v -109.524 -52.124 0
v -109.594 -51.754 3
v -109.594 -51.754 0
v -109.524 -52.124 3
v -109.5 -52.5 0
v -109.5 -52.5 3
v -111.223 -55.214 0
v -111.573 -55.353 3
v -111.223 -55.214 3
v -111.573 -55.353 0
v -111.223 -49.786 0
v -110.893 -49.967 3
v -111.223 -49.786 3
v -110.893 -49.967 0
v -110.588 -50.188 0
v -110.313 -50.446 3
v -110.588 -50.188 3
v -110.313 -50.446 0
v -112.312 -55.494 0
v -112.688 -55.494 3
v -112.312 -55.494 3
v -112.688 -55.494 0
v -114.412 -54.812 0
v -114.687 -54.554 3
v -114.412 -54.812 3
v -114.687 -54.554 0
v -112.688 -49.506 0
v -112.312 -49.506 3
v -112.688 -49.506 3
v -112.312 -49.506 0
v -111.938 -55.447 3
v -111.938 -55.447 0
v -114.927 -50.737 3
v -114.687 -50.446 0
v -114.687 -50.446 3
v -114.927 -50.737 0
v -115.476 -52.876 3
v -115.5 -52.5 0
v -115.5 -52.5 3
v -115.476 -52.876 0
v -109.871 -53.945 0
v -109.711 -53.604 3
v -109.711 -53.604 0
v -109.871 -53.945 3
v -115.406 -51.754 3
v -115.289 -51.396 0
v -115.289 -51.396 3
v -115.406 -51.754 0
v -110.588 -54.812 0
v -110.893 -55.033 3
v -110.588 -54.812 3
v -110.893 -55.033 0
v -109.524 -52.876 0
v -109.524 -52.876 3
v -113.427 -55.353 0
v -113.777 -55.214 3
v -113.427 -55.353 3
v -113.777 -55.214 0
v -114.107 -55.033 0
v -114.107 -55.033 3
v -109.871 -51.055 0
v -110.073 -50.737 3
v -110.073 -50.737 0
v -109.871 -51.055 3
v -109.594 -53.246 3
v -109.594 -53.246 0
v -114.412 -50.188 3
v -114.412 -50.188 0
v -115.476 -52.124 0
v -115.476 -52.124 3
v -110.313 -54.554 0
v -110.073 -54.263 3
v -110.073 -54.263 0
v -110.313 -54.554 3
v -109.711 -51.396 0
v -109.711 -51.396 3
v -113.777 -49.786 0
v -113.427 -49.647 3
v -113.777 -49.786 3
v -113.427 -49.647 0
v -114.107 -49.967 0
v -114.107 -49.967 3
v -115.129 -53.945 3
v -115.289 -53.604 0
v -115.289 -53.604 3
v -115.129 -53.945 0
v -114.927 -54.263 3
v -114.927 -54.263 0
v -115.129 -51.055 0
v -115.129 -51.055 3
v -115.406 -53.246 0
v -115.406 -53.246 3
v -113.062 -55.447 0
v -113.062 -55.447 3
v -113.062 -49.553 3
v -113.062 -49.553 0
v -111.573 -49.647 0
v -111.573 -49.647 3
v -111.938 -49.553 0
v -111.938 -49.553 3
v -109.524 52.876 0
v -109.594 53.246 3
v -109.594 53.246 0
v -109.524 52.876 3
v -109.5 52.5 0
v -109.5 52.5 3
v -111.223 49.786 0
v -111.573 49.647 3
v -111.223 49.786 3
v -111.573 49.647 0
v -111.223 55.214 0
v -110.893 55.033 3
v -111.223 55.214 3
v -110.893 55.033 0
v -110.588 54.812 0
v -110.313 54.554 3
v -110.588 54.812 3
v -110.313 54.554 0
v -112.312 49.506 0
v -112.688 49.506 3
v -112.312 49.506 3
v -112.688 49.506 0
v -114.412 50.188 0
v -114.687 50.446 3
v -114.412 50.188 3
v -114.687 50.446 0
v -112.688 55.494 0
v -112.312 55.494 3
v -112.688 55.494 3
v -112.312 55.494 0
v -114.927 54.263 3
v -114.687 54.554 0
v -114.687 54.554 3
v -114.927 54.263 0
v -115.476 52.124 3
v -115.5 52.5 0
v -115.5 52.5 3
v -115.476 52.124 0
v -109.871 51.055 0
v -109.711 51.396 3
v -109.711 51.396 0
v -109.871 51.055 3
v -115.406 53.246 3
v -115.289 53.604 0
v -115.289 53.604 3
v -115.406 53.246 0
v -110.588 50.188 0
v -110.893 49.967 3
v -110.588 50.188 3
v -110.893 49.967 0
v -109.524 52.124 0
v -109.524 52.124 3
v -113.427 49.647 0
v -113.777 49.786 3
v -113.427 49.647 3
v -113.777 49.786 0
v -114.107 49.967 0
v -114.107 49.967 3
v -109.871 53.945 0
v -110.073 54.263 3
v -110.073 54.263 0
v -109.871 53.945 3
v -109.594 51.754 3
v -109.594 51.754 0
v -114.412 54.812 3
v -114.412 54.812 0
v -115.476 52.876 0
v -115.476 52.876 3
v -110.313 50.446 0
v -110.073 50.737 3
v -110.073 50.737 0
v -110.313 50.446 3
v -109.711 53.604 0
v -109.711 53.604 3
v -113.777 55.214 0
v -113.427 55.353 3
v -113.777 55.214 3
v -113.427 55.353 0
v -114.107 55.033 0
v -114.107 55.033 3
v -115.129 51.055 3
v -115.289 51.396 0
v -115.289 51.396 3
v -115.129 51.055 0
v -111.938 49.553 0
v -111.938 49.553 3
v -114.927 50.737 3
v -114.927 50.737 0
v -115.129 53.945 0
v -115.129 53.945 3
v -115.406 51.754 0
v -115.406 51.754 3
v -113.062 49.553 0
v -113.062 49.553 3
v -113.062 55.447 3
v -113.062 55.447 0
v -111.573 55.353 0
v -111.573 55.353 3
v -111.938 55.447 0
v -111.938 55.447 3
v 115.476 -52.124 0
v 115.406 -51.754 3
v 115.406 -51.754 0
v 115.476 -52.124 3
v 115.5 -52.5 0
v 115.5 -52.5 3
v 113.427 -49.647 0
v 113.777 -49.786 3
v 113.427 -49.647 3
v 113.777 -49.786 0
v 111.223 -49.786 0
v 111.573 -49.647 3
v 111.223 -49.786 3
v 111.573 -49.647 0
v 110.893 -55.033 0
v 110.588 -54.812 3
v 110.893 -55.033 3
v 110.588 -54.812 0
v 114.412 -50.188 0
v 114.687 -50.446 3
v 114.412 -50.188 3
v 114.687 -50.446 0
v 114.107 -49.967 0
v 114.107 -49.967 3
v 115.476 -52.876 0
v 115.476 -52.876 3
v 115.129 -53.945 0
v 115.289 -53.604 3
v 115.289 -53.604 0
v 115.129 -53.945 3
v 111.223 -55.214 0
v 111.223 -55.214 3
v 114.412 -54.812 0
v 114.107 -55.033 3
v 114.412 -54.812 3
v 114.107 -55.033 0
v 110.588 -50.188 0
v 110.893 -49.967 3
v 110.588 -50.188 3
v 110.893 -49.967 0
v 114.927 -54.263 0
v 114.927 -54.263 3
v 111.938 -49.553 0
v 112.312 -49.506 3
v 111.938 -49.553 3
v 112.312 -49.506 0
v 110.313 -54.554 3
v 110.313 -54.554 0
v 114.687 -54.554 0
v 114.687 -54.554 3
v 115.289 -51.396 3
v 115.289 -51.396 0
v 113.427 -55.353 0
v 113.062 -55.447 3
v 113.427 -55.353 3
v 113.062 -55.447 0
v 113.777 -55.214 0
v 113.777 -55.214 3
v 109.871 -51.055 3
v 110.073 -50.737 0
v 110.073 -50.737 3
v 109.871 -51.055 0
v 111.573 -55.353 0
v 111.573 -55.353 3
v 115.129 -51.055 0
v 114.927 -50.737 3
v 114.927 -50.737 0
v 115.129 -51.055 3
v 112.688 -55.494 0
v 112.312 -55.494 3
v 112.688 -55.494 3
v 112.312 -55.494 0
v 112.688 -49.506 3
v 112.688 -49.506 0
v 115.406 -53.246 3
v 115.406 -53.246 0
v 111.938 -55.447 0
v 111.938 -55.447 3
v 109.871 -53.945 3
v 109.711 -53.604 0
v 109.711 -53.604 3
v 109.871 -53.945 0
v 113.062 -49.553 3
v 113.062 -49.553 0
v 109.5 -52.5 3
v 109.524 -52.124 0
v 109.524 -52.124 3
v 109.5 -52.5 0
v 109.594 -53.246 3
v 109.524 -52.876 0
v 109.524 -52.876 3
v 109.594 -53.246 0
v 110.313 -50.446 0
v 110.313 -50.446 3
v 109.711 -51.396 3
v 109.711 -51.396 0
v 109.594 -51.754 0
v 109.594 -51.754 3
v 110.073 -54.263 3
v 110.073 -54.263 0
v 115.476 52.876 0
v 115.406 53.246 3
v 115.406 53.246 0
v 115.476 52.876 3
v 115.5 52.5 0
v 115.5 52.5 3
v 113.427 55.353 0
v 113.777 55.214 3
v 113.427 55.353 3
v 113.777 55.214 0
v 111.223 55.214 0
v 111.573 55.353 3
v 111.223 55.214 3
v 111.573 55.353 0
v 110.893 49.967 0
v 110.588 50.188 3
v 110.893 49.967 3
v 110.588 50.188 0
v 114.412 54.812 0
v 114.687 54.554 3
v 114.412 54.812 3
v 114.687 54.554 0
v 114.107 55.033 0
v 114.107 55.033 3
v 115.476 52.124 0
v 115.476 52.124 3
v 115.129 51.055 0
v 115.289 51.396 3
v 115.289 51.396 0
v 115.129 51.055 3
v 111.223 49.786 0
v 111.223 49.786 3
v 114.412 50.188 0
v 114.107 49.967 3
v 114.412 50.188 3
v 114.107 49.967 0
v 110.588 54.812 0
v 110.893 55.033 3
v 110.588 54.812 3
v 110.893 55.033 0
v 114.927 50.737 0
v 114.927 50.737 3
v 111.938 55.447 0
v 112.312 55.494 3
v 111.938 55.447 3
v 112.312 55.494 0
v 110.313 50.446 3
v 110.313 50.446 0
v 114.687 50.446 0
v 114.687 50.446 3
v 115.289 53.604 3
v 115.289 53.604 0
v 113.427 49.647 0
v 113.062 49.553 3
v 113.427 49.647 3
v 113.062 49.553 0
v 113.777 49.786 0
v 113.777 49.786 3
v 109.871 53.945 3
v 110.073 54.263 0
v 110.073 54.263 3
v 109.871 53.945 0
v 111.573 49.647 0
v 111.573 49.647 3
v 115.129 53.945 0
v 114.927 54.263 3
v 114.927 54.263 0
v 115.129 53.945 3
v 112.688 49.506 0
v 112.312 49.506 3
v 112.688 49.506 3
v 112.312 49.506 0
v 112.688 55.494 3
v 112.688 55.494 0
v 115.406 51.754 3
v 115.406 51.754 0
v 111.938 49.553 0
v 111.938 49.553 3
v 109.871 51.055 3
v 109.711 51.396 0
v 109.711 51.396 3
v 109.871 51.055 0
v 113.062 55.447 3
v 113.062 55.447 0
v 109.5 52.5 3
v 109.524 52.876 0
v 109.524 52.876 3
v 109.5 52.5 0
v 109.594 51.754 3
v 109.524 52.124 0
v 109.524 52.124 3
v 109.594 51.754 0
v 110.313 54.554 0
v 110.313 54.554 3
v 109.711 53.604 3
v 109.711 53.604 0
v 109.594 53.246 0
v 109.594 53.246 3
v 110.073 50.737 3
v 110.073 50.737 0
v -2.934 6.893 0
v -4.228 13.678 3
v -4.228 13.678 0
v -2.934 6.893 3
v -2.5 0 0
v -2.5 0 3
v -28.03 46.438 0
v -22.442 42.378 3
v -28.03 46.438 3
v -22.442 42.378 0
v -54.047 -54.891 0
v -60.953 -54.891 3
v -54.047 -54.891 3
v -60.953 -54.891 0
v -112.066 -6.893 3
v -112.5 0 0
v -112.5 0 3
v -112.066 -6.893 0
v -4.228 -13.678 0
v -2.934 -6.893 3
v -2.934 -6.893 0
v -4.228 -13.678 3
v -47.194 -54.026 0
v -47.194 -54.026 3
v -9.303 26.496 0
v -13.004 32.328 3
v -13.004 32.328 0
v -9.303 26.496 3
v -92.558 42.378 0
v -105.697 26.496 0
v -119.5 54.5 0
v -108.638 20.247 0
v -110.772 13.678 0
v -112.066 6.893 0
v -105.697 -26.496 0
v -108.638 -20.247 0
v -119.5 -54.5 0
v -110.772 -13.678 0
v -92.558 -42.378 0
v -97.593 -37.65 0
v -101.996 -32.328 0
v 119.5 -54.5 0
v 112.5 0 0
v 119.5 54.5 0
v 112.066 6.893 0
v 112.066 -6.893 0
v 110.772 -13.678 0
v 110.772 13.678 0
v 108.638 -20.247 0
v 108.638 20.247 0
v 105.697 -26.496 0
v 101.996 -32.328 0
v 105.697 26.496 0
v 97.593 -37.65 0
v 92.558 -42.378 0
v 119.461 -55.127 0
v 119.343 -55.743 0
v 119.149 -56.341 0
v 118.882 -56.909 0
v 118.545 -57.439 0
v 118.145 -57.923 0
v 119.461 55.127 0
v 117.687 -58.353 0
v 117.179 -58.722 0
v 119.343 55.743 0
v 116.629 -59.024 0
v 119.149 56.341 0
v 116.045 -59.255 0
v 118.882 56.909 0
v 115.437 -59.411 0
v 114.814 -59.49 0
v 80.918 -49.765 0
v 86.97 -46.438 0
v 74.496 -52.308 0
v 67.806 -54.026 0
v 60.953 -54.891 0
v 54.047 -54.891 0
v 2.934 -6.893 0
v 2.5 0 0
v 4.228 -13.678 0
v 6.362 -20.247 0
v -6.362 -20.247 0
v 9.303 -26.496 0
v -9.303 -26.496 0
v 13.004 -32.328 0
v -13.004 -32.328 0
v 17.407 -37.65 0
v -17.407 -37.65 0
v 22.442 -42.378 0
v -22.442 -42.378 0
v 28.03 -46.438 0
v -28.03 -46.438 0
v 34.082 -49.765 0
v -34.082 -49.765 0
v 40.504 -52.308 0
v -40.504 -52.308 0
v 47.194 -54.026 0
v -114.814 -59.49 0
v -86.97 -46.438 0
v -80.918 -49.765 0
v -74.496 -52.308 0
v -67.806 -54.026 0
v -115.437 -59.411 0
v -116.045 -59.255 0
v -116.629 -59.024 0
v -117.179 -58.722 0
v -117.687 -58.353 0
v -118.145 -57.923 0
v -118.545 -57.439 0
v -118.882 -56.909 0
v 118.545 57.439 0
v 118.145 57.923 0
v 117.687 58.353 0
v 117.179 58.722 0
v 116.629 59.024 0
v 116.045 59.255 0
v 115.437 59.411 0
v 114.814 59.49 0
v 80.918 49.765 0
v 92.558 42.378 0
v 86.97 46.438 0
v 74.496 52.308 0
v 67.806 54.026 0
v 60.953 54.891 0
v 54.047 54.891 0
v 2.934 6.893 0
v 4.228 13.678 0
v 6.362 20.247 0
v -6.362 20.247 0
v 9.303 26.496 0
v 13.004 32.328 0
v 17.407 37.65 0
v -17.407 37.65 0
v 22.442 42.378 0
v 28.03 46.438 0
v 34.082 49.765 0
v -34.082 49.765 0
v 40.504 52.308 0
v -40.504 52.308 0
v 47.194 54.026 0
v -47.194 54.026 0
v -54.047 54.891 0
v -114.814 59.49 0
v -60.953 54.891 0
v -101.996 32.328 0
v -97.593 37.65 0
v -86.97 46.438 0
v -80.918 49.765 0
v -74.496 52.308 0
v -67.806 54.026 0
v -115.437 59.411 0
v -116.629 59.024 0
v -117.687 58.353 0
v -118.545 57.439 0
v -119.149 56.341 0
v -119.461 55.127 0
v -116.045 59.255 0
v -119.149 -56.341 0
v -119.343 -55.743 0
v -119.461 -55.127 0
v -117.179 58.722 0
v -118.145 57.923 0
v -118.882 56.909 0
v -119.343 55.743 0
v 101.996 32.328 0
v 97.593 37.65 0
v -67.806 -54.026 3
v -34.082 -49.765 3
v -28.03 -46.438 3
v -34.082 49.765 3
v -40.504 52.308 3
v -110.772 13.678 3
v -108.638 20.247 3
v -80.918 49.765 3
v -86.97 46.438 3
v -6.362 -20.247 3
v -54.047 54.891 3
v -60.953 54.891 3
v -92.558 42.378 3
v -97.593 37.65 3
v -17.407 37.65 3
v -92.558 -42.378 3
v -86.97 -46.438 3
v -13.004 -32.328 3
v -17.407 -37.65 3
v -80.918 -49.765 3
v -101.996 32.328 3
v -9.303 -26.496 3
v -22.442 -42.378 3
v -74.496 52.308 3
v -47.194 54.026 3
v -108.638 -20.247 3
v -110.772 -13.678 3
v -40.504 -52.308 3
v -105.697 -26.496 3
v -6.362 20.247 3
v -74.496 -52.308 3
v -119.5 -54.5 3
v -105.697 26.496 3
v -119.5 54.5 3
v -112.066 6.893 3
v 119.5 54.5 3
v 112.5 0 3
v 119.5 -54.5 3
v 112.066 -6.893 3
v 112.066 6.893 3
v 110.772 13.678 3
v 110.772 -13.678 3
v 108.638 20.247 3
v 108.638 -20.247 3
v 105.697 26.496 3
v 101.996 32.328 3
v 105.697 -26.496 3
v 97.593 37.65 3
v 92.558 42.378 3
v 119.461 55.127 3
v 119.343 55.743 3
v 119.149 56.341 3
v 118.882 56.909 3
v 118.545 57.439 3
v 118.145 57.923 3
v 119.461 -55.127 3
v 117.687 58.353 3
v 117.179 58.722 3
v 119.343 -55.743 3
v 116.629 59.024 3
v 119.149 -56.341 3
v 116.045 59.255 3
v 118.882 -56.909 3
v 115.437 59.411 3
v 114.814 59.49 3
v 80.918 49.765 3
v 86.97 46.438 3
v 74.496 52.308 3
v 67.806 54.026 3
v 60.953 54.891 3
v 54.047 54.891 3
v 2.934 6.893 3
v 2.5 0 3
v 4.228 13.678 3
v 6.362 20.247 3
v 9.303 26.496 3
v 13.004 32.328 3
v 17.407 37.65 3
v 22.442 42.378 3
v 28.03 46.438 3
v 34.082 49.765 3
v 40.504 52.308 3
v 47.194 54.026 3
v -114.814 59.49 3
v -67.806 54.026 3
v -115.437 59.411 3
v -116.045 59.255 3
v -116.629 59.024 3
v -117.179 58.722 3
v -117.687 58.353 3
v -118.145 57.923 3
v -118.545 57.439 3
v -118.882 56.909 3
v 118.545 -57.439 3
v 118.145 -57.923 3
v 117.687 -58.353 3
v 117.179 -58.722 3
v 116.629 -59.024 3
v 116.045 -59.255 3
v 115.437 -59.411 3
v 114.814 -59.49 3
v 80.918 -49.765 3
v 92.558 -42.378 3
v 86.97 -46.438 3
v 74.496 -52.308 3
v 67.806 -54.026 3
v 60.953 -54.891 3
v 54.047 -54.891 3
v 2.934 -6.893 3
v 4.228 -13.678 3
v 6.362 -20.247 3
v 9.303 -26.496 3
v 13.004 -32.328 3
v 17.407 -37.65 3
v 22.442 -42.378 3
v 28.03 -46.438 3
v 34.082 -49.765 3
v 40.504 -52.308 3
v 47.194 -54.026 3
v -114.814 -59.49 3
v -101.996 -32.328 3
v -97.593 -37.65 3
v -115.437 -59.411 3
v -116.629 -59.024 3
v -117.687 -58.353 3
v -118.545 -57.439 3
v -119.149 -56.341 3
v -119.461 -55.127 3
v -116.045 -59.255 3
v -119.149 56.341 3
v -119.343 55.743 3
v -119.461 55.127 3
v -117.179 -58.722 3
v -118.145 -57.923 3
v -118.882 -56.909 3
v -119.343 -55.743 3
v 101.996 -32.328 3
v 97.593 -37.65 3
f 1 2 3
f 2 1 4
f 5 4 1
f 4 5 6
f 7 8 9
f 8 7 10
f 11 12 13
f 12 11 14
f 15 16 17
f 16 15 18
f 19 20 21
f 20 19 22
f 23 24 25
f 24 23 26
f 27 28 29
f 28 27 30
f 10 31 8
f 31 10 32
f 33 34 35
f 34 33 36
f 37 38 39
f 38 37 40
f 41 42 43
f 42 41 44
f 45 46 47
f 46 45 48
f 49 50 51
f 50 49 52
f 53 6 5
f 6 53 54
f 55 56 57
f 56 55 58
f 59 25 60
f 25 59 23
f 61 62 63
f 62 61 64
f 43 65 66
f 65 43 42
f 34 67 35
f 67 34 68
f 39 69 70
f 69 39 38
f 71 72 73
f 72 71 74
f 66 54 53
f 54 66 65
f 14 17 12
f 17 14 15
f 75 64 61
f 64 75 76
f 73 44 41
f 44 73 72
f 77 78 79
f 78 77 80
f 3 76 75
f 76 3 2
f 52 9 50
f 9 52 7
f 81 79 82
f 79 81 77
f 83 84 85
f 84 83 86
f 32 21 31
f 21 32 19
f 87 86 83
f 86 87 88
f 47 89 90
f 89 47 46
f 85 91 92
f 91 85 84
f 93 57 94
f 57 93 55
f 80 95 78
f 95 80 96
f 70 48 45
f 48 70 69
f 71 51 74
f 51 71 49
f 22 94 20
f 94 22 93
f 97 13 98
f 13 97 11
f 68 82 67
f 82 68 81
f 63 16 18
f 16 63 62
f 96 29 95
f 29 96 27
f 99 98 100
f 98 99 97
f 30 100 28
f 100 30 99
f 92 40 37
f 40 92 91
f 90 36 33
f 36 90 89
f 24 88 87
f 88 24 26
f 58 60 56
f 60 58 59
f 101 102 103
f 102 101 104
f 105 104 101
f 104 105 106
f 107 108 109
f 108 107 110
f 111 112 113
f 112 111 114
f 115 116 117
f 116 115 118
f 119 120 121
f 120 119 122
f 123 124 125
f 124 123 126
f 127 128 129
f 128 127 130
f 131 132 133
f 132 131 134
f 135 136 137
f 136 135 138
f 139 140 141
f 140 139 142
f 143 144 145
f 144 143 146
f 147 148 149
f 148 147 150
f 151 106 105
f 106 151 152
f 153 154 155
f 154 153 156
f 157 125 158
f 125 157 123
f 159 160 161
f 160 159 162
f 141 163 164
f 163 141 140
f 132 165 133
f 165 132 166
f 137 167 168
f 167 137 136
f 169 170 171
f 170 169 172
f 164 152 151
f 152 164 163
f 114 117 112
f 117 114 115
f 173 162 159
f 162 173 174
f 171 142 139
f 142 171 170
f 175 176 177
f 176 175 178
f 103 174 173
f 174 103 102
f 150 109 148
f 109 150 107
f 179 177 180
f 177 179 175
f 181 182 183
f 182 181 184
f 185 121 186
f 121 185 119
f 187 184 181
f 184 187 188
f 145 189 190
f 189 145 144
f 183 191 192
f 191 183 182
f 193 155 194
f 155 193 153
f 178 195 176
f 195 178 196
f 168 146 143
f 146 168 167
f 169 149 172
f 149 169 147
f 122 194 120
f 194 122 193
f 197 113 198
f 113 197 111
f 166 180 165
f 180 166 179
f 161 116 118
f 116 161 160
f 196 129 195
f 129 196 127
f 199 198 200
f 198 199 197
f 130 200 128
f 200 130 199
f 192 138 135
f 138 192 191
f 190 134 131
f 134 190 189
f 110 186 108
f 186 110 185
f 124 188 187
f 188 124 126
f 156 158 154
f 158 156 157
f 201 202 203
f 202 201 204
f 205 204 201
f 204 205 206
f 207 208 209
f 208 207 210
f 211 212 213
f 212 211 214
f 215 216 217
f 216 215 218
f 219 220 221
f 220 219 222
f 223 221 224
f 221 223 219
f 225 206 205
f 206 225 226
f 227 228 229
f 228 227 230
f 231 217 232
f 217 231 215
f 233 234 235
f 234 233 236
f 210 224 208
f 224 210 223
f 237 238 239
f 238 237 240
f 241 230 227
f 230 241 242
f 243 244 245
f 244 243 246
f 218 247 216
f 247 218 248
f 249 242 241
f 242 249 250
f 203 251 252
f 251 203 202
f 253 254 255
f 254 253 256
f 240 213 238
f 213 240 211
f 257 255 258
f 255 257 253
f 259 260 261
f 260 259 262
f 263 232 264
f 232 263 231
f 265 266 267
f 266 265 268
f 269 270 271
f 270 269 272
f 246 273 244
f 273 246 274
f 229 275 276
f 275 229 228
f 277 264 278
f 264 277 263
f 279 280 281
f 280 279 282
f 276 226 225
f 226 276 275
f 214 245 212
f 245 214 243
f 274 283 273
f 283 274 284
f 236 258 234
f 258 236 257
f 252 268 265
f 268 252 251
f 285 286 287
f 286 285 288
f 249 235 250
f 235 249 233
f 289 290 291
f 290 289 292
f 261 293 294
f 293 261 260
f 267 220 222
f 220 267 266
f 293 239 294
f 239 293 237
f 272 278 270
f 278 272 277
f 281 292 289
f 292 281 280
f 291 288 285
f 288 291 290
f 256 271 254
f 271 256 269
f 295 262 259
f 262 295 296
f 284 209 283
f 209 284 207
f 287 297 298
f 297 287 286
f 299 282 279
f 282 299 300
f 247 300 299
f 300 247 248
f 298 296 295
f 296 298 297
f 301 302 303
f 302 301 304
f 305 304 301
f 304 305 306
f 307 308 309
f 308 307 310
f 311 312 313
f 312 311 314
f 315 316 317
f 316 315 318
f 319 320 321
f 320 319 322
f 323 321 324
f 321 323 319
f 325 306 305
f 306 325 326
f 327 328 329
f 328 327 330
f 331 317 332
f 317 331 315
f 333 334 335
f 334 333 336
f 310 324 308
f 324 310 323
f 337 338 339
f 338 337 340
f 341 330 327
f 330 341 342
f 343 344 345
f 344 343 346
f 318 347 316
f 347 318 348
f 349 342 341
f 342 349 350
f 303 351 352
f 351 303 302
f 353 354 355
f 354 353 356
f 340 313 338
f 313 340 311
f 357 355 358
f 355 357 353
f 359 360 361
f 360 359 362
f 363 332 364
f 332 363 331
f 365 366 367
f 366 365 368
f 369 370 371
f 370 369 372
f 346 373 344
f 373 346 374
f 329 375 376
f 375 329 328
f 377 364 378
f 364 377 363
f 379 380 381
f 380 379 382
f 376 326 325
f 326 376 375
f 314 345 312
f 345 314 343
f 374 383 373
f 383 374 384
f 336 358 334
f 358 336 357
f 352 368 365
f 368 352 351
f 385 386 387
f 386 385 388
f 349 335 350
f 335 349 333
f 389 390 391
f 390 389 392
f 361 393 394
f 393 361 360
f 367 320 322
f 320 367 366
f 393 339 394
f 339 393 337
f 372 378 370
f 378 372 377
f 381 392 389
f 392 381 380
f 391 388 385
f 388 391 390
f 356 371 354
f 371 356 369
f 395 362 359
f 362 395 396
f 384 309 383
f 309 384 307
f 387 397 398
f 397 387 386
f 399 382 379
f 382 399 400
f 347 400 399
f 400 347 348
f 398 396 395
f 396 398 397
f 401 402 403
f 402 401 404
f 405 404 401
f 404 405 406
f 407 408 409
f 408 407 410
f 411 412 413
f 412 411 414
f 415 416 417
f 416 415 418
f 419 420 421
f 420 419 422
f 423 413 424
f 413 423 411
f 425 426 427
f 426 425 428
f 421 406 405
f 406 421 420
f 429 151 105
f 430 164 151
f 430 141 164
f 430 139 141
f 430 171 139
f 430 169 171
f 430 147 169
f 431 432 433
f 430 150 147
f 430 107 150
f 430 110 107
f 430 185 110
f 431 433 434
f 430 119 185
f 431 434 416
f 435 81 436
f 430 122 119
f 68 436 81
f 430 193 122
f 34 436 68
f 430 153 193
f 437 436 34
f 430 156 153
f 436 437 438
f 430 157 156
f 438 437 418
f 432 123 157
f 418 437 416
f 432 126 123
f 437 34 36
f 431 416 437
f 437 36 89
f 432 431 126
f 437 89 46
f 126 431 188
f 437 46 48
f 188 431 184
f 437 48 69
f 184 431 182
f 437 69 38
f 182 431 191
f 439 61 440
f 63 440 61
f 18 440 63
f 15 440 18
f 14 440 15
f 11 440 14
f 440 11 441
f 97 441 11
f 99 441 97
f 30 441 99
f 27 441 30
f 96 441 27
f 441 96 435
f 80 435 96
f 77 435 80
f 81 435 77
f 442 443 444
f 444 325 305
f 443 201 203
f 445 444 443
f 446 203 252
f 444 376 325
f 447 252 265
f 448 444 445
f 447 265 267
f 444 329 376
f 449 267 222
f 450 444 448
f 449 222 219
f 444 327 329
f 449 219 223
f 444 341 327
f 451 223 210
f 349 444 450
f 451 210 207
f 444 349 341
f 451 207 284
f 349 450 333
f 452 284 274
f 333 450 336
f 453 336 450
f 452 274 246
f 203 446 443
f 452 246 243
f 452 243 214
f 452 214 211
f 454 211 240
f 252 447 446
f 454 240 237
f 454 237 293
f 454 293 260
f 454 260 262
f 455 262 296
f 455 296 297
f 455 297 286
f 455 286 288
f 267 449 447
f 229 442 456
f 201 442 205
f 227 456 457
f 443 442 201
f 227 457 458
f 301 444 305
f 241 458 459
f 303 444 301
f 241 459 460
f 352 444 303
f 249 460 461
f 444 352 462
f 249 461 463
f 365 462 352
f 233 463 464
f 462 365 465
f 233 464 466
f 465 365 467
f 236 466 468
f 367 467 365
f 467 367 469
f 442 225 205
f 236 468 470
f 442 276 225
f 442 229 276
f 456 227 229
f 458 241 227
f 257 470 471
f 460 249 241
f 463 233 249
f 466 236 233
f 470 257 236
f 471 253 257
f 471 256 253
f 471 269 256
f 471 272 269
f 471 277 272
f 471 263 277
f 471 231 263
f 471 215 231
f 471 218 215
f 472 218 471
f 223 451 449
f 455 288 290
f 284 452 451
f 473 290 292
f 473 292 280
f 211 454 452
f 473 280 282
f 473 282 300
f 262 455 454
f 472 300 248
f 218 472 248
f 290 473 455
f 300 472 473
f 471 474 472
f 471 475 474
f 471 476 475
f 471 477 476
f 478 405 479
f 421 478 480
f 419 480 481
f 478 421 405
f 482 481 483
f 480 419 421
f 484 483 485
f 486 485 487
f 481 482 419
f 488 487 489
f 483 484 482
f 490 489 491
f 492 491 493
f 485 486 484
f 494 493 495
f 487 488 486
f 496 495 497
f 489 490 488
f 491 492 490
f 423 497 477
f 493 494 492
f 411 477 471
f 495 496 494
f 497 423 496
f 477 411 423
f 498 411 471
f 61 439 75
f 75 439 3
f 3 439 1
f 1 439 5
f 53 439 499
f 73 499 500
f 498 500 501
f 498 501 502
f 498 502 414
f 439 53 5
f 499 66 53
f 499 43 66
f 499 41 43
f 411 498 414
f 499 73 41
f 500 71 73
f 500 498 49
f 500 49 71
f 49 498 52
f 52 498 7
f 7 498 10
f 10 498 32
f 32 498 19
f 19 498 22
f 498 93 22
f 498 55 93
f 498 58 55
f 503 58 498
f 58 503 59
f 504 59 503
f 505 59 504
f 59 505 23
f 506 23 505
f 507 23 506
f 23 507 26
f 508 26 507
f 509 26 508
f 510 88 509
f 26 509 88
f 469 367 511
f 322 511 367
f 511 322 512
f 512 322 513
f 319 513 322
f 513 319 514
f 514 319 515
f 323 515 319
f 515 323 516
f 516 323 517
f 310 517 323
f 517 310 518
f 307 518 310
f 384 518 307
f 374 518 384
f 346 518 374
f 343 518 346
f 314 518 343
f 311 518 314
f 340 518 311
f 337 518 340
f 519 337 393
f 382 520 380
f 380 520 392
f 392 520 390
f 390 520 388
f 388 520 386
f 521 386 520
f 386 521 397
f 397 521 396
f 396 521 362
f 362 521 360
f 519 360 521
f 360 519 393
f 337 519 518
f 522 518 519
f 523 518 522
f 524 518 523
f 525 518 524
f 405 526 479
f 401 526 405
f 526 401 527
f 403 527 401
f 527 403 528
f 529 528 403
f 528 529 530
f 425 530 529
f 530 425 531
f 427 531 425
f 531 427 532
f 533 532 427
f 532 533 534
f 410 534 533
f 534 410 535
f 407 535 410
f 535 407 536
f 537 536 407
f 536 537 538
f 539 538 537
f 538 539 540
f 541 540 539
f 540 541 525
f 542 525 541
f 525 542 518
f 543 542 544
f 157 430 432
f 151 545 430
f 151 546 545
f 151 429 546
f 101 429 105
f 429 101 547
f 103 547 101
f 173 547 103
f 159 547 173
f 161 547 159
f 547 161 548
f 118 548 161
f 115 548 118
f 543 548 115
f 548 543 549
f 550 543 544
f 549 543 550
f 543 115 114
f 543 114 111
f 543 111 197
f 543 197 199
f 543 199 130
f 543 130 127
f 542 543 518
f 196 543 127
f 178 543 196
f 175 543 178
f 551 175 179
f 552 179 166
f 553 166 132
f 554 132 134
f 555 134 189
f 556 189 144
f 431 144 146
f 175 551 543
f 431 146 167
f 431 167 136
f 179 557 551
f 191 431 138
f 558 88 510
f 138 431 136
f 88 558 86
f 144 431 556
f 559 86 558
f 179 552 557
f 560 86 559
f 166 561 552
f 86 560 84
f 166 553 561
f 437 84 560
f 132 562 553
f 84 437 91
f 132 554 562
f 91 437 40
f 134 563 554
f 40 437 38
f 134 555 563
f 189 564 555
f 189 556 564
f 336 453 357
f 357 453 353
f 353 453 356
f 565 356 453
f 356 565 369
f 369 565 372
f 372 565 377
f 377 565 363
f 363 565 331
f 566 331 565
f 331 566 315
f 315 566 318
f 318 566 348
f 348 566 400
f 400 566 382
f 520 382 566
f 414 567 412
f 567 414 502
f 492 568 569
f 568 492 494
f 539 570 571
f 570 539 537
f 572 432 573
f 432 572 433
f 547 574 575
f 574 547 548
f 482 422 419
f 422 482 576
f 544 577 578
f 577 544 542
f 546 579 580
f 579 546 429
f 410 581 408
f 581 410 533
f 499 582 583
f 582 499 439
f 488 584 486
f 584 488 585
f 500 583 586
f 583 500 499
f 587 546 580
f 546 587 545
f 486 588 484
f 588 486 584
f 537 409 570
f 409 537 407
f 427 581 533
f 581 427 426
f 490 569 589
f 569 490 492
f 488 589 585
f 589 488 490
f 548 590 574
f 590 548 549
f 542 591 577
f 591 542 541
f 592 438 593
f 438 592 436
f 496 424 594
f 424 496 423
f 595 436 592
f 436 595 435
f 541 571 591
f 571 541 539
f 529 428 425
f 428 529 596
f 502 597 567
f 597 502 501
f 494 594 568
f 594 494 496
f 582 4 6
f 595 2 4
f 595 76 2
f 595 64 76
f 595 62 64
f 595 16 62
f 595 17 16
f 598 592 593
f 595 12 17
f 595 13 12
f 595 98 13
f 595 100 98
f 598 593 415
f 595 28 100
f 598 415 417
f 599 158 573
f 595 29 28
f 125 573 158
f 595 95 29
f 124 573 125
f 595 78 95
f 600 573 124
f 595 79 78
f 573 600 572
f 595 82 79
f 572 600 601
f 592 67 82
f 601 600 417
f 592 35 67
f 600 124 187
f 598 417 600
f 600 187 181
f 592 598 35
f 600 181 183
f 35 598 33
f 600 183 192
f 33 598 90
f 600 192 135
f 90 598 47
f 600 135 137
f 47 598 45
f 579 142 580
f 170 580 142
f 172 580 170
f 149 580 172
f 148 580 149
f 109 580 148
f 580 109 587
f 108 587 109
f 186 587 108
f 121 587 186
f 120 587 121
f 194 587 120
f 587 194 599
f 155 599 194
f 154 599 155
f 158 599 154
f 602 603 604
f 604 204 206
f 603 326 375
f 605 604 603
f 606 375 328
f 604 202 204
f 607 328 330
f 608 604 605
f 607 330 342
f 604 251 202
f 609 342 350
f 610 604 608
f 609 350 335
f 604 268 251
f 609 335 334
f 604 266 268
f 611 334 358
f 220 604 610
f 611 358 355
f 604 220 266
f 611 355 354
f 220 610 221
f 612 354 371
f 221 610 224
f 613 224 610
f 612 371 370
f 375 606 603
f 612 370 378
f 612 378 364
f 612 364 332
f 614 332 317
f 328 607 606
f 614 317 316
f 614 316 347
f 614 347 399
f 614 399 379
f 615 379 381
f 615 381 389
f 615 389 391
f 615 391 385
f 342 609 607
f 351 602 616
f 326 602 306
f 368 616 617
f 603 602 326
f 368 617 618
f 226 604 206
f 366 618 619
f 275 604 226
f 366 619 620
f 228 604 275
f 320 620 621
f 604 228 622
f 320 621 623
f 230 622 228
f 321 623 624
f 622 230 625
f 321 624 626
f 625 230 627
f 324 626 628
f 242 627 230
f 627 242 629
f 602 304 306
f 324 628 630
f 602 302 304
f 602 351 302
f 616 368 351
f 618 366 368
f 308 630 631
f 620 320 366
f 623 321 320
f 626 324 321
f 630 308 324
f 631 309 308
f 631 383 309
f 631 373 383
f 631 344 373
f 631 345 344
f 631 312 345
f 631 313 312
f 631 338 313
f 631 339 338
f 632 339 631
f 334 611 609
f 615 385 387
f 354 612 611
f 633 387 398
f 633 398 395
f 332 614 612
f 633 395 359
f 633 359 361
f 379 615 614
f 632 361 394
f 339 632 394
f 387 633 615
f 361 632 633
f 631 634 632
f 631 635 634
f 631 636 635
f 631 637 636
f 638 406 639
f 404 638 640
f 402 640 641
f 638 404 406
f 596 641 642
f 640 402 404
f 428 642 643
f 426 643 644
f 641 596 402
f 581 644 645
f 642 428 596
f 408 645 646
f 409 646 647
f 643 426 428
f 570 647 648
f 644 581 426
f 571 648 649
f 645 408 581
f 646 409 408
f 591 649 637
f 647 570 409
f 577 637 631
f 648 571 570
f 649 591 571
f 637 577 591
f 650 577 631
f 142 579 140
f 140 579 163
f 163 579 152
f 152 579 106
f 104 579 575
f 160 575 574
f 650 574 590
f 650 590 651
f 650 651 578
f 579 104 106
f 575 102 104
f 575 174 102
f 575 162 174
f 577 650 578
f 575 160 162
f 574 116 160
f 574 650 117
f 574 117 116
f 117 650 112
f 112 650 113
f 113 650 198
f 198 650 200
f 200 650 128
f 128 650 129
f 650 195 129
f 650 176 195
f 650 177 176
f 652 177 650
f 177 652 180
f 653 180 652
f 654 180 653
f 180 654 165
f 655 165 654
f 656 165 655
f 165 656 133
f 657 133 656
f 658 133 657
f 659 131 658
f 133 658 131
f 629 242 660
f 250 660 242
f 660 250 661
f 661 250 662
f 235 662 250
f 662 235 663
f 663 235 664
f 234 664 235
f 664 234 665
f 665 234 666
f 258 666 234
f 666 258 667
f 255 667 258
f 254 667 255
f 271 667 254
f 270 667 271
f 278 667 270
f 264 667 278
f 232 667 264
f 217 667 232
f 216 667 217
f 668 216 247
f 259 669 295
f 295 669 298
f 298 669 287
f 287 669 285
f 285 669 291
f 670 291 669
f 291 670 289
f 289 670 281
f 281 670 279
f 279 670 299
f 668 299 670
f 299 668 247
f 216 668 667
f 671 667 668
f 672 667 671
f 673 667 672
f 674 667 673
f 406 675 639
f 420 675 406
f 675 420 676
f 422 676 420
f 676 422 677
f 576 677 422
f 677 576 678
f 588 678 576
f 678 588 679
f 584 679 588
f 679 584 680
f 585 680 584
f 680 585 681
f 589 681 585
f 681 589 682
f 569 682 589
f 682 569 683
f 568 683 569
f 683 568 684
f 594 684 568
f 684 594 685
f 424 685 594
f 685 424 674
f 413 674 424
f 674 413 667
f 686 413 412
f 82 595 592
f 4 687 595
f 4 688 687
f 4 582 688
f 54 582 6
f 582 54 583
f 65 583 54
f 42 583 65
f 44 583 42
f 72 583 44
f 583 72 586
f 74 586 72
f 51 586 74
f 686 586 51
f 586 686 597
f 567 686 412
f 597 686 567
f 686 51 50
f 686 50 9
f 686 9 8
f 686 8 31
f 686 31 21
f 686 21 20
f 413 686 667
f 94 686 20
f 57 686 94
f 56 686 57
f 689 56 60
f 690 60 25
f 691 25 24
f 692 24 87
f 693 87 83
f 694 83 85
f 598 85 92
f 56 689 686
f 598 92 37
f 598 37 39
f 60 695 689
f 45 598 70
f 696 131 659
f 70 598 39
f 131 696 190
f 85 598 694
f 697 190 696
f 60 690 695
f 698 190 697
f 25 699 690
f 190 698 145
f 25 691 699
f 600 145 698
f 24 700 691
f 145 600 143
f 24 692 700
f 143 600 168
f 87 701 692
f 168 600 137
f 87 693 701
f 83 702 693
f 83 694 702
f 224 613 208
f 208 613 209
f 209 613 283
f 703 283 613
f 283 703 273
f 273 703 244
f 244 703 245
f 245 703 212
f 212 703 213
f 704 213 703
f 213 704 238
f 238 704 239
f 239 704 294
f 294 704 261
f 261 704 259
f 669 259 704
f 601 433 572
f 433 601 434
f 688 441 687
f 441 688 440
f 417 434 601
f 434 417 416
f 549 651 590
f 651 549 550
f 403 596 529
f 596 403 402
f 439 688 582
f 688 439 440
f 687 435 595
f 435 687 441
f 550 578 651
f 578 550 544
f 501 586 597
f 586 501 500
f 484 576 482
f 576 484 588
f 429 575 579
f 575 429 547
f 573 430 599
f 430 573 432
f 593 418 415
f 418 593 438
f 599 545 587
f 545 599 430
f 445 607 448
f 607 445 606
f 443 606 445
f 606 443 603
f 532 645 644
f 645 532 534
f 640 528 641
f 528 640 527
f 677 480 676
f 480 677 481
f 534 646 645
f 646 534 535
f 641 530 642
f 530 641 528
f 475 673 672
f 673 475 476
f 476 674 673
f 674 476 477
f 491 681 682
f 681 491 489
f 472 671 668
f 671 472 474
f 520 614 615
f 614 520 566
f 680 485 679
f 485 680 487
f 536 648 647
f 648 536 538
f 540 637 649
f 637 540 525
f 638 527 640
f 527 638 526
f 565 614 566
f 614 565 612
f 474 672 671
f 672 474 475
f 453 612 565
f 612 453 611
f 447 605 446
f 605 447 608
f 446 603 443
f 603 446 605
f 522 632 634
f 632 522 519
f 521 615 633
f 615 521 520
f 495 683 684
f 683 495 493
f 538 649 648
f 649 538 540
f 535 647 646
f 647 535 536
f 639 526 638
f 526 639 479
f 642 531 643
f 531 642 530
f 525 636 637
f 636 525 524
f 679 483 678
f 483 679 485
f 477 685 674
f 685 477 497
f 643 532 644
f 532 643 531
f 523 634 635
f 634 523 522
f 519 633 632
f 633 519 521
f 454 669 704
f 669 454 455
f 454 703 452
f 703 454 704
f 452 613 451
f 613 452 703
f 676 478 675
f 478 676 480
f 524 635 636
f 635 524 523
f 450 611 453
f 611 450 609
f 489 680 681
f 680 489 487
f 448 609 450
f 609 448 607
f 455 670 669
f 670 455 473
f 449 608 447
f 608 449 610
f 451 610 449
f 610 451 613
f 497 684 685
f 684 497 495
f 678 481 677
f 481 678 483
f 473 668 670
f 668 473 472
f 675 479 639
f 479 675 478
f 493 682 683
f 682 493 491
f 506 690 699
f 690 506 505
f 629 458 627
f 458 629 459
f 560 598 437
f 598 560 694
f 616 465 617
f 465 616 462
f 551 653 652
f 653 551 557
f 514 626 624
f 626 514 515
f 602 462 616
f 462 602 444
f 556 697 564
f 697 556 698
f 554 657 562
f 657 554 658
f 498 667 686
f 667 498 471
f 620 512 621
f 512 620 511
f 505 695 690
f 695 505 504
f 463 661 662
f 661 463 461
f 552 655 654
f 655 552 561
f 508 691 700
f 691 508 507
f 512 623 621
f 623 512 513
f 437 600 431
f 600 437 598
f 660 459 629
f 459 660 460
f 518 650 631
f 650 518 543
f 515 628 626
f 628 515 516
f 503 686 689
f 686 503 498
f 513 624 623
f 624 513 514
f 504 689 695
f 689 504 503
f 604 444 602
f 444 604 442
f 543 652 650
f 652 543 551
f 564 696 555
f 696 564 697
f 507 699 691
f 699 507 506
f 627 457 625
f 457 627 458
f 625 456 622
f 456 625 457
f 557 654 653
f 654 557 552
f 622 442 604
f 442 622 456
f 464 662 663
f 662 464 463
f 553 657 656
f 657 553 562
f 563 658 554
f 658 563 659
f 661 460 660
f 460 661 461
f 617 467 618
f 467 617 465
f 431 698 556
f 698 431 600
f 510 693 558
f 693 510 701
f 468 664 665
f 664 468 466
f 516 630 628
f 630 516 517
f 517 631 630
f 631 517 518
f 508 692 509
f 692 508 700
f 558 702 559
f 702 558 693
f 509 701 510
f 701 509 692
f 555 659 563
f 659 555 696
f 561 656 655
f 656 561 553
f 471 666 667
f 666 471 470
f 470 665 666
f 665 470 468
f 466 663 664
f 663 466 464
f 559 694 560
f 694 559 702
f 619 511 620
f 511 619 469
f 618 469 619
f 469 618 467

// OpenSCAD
$fn = 50;


difference() {
	union() {
		hull() {
			translate(v = [-114.5000000000, 54.5000000000, 0]) {
				cylinder(h = 3, r = 5);
			}
			translate(v = [114.5000000000, 54.5000000000, 0]) {
				cylinder(h = 3, r = 5);
			}
			translate(v = [-114.5000000000, -54.5000000000, 0]) {
				cylinder(h = 3, r = 5);
			}
			translate(v = [114.5000000000, -54.5000000000, 0]) {
				cylinder(h = 3, r = 5);
			}
		}
	}
	union() {
		#translate(v = [-112.5000000000, -52.5000000000, -100.0000000000]) {
			cylinder(h = 200, r = 3.0000000000);
		}
		#translate(v = [-112.5000000000, 52.5000000000, -100.0000000000]) {
			cylinder(h = 200, r = 3.0000000000);
		}
		#translate(v = [112.5000000000, -52.5000000000, -100.0000000000]) {
			cylinder(h = 200, r = 3.0000000000);
		}
		#translate(v = [112.5000000000, 52.5000000000, -100.0000000000]) {
			cylinder(h = 200, r = 3.0000000000);
		}
		#translate(v = [-57.5000000000, 0, 0]) {
			cylinder(h = 3, r = 55.0000000000);
		}
		#translate(v = [57.5000000000, 0, 0]) {
			cylinder(h = 3, r = 55.0000000000);
		}
	}
}
